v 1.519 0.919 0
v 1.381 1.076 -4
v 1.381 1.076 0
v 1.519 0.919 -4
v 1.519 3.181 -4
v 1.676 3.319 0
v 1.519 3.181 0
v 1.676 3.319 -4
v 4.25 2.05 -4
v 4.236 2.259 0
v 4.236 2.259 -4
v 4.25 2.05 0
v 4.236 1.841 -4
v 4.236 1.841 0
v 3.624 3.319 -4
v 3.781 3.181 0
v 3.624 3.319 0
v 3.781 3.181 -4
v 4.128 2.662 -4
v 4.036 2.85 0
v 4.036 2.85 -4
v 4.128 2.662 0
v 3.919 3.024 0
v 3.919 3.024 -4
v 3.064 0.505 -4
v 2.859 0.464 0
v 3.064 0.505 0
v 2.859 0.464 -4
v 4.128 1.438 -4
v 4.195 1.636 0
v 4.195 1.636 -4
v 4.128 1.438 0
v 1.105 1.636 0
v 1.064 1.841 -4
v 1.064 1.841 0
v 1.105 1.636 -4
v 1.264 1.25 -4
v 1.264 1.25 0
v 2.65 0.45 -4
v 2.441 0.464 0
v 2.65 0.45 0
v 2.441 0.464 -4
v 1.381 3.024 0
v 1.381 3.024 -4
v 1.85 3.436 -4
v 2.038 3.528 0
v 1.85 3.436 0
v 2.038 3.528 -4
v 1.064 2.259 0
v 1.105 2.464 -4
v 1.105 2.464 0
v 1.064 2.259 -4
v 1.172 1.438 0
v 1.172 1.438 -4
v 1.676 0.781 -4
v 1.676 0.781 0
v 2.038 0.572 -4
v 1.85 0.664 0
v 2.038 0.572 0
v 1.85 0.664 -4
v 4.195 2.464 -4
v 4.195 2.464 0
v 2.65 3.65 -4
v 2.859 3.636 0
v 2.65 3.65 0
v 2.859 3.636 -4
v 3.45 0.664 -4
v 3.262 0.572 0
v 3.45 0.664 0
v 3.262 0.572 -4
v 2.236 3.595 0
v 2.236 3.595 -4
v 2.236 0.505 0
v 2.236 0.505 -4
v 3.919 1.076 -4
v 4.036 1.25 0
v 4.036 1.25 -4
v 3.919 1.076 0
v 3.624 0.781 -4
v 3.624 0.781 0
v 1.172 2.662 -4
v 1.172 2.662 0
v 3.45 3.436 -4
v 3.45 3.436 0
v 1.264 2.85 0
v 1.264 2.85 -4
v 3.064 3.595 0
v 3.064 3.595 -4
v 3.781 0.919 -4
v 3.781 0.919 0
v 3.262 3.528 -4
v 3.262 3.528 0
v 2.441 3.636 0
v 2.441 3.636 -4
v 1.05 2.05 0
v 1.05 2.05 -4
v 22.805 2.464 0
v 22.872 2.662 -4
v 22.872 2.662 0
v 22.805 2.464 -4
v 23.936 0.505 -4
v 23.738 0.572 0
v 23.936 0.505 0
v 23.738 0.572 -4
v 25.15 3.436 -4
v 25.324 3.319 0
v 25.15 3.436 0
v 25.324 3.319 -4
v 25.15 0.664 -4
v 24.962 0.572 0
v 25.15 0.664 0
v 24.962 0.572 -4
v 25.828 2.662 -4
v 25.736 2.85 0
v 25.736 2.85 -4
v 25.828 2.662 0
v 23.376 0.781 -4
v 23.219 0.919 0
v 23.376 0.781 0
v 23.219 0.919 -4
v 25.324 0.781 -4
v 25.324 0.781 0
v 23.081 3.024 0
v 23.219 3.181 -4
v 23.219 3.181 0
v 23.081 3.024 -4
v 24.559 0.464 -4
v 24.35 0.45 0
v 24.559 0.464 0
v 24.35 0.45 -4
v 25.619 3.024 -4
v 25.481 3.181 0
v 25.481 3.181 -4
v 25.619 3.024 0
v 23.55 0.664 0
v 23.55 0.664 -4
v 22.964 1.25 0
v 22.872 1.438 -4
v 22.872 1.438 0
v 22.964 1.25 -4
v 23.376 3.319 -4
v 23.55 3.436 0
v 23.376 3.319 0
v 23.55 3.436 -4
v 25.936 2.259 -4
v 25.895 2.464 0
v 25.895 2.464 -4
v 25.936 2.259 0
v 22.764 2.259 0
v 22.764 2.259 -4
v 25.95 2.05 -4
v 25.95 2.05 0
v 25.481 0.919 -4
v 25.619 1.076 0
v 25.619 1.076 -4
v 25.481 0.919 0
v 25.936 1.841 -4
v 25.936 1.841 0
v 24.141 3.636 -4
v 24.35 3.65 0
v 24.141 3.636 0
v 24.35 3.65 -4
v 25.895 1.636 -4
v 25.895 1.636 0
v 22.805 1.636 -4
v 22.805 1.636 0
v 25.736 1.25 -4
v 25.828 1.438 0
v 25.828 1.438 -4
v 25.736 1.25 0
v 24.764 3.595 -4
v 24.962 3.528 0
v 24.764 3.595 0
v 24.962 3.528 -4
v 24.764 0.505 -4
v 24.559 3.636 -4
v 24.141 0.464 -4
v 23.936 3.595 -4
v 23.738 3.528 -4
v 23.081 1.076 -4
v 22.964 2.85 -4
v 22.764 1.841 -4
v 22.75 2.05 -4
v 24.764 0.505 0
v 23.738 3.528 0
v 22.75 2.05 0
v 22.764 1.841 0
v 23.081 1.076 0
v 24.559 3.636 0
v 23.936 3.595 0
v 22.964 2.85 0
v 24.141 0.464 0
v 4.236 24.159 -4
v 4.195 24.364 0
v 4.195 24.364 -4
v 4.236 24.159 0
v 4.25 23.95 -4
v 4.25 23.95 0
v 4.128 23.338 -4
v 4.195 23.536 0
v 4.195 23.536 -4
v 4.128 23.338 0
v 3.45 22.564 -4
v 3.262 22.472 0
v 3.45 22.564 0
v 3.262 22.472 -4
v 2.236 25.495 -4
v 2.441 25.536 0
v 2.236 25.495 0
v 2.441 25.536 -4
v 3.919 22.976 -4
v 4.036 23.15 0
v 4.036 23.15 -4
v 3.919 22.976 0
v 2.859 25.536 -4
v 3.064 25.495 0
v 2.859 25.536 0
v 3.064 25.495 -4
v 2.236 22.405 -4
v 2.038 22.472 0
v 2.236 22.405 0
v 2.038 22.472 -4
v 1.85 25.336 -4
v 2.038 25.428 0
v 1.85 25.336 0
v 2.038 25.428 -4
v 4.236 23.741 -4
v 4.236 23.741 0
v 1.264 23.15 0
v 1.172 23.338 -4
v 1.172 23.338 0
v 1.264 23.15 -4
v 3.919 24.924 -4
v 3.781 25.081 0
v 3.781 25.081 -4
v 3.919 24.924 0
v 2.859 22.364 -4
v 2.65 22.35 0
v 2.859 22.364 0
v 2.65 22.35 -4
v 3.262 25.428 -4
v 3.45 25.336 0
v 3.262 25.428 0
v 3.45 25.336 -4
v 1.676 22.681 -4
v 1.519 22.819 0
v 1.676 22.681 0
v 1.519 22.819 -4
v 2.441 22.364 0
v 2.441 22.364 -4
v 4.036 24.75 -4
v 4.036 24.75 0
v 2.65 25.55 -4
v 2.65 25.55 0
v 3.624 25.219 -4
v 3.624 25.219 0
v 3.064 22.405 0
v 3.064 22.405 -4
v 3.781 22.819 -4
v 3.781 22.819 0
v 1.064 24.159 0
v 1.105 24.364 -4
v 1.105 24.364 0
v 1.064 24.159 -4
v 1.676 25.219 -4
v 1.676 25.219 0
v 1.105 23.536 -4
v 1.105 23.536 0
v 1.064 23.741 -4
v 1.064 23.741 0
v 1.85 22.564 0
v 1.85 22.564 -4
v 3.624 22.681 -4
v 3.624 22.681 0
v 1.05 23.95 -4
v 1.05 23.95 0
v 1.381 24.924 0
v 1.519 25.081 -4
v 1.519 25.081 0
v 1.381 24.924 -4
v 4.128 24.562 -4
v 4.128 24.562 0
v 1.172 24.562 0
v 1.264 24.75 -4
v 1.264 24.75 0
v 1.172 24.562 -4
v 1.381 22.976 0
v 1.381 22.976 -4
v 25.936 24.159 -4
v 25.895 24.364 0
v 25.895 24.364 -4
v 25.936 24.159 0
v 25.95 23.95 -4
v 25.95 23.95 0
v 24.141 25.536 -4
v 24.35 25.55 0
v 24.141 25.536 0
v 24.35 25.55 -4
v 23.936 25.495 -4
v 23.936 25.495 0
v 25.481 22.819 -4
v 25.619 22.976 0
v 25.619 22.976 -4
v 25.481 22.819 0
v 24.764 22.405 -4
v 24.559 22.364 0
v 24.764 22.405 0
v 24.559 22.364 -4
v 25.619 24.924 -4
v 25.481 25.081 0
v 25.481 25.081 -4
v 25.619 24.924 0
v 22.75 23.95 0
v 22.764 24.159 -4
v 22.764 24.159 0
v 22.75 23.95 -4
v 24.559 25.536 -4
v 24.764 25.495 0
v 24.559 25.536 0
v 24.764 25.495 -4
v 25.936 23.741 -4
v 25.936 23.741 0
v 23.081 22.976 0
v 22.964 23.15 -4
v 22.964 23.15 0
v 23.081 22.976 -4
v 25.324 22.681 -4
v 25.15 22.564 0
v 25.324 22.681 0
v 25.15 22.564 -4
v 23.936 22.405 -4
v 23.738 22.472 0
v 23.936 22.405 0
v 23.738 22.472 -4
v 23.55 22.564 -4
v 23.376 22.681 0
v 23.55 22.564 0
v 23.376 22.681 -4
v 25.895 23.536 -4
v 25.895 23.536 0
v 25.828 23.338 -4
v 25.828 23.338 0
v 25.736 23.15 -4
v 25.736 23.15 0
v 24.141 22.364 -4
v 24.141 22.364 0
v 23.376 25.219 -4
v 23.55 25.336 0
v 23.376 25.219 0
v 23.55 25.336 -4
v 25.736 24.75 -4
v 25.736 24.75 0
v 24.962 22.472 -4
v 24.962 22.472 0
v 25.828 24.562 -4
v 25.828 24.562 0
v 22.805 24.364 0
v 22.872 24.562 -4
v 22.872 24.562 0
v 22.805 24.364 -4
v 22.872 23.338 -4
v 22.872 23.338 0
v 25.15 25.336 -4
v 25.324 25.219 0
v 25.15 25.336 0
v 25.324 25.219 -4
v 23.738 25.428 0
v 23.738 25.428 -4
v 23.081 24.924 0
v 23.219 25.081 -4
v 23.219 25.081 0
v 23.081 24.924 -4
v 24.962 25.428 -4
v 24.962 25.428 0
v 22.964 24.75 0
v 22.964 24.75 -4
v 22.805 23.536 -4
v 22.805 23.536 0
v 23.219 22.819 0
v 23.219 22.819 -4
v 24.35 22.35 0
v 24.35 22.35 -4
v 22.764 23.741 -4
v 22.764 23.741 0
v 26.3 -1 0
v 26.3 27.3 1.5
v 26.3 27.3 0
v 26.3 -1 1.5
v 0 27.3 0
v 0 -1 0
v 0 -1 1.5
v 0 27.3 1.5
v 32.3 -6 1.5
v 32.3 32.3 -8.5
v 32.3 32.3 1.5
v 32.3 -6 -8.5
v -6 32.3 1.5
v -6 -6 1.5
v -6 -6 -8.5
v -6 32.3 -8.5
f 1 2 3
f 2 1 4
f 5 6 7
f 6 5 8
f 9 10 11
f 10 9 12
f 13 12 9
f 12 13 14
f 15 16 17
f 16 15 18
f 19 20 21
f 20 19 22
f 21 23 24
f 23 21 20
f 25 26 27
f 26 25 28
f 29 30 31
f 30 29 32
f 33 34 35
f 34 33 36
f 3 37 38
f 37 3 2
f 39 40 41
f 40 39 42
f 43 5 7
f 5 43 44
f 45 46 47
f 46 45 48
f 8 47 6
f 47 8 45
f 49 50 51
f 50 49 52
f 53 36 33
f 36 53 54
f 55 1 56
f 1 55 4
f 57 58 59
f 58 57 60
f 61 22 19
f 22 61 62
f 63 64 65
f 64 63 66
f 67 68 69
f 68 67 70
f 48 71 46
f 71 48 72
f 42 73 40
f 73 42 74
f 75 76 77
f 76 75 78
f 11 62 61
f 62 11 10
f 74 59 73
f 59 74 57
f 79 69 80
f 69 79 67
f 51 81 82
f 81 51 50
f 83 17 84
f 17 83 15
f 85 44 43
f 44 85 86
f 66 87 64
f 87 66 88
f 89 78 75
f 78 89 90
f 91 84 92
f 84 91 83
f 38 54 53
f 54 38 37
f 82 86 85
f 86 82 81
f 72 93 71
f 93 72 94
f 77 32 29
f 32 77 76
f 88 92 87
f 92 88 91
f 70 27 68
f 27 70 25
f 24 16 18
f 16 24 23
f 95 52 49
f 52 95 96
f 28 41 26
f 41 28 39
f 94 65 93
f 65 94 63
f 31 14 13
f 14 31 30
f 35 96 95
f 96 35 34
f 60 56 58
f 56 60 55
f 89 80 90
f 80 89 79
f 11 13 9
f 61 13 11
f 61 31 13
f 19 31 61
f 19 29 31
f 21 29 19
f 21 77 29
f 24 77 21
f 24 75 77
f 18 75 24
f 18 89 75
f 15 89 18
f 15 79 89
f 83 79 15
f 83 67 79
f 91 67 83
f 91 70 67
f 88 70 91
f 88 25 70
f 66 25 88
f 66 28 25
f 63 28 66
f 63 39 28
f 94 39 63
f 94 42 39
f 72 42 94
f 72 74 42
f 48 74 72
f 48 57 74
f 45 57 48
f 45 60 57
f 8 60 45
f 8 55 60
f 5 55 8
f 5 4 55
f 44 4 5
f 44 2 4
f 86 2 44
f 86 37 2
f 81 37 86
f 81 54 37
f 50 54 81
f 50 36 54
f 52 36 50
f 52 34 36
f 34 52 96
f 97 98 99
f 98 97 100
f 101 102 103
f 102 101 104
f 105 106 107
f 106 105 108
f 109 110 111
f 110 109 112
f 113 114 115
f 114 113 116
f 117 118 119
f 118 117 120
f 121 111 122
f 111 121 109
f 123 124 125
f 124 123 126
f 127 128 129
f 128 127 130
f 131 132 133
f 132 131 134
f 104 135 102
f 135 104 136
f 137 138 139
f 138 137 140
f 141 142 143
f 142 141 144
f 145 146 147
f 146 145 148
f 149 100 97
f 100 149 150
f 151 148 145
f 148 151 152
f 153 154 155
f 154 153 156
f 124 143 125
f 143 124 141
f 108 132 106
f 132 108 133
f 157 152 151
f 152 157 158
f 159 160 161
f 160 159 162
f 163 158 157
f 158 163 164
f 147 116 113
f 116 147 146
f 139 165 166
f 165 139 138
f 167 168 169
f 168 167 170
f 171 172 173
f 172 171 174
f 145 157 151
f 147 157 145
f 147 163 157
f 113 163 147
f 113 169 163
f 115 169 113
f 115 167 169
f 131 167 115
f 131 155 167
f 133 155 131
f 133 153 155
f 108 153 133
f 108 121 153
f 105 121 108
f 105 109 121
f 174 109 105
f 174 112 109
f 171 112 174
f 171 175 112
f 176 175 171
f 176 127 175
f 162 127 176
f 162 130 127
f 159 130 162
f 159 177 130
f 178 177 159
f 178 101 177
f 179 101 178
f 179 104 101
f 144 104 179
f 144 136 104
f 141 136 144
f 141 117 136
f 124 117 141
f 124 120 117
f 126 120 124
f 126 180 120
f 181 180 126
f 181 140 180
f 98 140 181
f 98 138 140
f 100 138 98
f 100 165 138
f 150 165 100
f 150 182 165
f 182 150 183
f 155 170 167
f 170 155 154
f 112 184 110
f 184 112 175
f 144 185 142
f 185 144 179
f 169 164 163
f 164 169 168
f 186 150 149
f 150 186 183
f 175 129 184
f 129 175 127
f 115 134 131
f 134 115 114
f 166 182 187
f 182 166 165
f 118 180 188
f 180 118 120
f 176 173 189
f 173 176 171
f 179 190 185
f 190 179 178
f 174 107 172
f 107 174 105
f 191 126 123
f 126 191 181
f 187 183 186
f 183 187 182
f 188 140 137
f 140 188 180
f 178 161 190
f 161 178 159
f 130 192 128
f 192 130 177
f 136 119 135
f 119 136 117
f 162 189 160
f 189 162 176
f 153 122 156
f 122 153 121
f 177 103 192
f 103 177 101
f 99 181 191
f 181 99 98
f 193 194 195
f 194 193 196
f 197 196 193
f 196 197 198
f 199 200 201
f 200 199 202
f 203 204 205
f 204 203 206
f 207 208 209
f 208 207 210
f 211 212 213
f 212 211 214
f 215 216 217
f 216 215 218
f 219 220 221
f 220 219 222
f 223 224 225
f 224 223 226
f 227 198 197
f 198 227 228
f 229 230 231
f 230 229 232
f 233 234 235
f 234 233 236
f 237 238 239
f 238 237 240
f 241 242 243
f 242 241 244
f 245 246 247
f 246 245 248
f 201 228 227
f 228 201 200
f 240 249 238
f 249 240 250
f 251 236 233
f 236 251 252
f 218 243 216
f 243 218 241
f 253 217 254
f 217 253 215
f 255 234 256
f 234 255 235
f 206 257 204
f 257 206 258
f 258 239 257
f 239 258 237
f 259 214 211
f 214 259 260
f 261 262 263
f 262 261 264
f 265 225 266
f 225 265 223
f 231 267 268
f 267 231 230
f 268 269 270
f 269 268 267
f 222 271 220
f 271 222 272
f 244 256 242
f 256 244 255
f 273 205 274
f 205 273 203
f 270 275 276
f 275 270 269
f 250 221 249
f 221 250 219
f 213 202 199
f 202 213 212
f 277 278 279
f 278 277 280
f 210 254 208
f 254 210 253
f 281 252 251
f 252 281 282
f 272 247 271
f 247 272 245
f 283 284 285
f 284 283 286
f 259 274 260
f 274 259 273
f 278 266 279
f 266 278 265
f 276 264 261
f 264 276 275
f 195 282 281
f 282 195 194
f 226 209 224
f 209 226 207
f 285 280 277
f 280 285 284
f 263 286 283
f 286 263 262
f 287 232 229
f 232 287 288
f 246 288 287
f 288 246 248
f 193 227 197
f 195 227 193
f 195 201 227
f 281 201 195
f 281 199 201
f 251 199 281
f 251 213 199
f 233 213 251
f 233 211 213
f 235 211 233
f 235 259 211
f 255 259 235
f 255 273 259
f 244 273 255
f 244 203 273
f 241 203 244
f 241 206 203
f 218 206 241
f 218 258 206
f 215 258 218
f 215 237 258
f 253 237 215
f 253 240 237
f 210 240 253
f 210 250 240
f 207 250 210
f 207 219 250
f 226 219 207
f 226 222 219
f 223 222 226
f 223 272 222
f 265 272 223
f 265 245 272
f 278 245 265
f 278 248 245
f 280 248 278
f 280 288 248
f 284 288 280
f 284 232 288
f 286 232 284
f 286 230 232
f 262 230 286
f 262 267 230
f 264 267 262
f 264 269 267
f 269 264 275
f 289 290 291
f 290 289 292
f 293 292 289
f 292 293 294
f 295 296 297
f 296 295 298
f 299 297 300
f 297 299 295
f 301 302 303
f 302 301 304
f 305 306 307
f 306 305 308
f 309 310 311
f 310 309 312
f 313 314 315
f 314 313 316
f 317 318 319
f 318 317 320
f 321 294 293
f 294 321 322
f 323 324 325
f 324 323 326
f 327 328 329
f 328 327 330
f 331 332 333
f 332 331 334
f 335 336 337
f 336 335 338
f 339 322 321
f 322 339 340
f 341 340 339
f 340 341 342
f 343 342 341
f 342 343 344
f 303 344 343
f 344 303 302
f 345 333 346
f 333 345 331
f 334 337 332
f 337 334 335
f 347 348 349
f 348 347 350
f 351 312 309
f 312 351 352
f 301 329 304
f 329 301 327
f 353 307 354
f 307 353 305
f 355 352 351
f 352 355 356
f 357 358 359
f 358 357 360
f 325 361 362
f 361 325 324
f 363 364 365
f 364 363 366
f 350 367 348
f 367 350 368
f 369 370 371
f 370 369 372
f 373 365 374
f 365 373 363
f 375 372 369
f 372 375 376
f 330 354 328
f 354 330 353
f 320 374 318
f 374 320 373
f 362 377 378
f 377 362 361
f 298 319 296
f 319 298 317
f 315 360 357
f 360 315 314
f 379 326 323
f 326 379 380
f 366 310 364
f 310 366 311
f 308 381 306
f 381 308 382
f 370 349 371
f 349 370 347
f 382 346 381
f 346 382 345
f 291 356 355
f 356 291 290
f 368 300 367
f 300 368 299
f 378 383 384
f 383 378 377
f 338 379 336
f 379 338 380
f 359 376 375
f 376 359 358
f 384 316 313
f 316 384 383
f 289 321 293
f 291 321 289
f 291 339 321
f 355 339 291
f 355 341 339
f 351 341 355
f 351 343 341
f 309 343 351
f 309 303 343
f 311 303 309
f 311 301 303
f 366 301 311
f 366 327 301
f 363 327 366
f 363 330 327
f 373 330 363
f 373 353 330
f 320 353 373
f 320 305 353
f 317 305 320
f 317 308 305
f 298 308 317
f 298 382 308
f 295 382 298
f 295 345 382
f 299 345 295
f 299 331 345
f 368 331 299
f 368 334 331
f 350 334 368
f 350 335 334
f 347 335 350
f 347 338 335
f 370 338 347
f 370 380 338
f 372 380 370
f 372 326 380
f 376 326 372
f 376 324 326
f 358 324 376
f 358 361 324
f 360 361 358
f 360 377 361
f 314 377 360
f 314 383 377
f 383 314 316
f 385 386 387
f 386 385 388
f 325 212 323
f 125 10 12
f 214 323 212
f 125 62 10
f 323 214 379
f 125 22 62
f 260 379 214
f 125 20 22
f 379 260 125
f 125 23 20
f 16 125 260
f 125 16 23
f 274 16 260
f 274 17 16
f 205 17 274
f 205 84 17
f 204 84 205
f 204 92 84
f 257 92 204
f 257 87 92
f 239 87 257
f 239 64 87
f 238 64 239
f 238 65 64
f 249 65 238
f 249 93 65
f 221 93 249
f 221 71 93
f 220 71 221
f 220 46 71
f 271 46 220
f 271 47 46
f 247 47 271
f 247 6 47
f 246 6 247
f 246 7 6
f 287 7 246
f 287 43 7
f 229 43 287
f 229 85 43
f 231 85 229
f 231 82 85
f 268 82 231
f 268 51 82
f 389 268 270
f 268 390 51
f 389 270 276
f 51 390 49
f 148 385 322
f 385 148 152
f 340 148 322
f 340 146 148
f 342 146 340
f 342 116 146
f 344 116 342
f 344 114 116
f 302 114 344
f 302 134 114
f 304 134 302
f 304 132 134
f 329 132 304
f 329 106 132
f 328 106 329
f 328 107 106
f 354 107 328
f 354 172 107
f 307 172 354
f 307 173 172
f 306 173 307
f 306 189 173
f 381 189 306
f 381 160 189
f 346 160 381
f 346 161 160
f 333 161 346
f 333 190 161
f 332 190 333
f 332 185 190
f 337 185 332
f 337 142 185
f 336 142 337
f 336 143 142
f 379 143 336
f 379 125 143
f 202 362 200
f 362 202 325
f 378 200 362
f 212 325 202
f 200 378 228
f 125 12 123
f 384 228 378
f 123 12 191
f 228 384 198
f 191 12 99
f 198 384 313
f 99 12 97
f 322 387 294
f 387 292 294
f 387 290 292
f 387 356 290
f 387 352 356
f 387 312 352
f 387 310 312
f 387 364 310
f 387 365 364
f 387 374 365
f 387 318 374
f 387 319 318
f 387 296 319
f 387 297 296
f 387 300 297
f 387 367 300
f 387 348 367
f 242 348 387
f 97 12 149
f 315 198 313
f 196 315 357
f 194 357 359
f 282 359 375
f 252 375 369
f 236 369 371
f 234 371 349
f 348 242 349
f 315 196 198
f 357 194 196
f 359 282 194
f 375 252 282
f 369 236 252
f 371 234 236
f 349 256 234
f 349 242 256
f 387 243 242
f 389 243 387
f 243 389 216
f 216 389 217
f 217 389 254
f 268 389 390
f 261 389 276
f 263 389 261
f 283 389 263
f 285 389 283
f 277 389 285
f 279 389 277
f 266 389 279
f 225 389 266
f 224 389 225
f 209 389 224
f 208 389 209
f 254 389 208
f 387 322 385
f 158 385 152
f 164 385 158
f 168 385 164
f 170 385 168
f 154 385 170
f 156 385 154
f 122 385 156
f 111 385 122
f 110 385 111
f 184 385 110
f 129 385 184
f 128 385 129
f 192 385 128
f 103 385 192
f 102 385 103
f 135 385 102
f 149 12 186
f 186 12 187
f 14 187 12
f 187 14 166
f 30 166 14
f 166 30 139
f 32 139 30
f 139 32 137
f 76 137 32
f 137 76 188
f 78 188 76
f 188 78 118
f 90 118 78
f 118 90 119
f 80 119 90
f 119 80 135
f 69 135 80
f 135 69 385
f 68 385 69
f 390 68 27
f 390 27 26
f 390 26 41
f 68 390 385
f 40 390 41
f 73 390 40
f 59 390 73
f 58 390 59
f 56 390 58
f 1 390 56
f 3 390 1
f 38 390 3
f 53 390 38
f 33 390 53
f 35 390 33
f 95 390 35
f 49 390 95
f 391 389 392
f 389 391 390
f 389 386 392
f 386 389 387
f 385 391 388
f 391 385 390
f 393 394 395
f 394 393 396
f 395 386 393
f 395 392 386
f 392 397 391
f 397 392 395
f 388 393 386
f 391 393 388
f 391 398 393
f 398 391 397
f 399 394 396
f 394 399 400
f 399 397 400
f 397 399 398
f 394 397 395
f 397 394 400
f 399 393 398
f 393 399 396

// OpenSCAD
// file: screw_mounts.scad
// ============================================================
// Screw mounts — reusable brass-insert + screw-hole cutters
//
// Two negative-geometry modules, meant to be subtracted (difference())
// from a part.  They are the matched halves of one fastened joint:
//
//   insert_hole(size)        bore for a brass heat-set insert, pressed
//                            into the part that the screw threads INTO.
//   screw_hole(size, length) clearance hole in the COMPLEMENTARY part the
//                            screw passes THROUGH — exact screw-body bore
//                            that tapers out (countersink) into the head.
//
// `size` is "M2" or "M3".  Dimensions for the inserts match those already
// used in sight_housing.scad (M2: ø3.20 × 4.0; M3: ø4.00 × 5.0).
//
// Orientation convention (both modules):
//   The mouth of the hole sits at the LOCAL ORIGIN on the Z=0 plane and
//   the hole bores DOWNWARD into -Z, i.e. the fastener is imagined entering
//   from +Z.  Each cutter pokes +0.1 mm past Z=0 so the Boolean cleanly
//   breaks the surface.  translate()/rotate() the call to place it on the
//   real face, exactly like the bores in sight_housing.scad.
//
//   insert_hole : insert is pressed in from +Z; bore is +Z-deep into stock.
//   screw_hole  : head sits flush at Z=0 (countersunk), body bores to -Z.
// ============================================================

// ── Fastener table ───────────────────────────────────────────
// One row per screw size.  Head thickness is the user-specified value
// (M3 = 1.75 mm, M2 = 1.50 mm); head diameter is the user-specified
// countersunk flat-head OD (M3 = 5.8, M2 = 4.0).  Body diameter is the
// nominal thread OD — the screw hole uses this EXACTLY (see screw_hole()).
function screw_body_d(size) =
  size == "M3" ? 3.00 :
  size == "M2" ? 2.00 : undef;

function screw_head_d(size) =
  size == "M3" ? 5.80 :
  size == "M2" ? 4.00 : undef;

function screw_head_t(size) =
  size == "M3" ? 1.75 :
  size == "M2" ? 1.50 : undef;

// Brass heat-set insert bore (outer dia + length) — values shared with
// sight_housing.scad's insert_d / insert_depth (M2) and join_insert_d /
// join_insert_depth (M3).
function insert_bore_d(size) =
  size == "M3" ? 4.00 :
  size == "M2" ? 3.20 : undef;

function insert_bore_depth(size) =
  size == "M3" ? 5.00 :
  size == "M2" ? 4.00 : undef;

// ── Brass-insert bore ────────────────────────────────────────
// Pocket for a heat-set insert, pressed in from +Z.  Bores `depth` into
// -Z (default = the size's standard insert length) and pokes 0.1 mm past
// the Z=0 face so the cut breaks the surface cleanly.
//   depth : override the bore depth (mm).  Leave default for the standard
//           insert length.
module insert_hole(size, depth = undef) {
  d = insert_bore_d(size);
  h = depth == undef ? insert_bore_depth(size) : depth;
  translate([0, 0, -h])
    cylinder(d = d, h = h + 0.1);
}

// ── Screw clearance hole + head countersink ──────────────────
// Cut in the complementary part the screw passes THROUGH.  The straight
// bore is EXACTLY the screw-body diameter (plus optional `clearance`,
// default 0 — a true body-diameter hole as requested); the top
// screw_head_t(size) mm flares out as a cone from the body diameter up to
// the full head diameter, so a countersunk head seats flush at Z=0.
//   length    : straight body-bore length below the taper (mm).  Set to
//               the wall/material thickness the screw shank crosses; the
//               taper sits on top of this, the bore pokes 0.1 mm past the
//               far side for a clean break.
//   clearance : added to the body diameter (mm).  Default 0 = exact body
//               diameter.  Use e.g. 0.4 for a free-fit clearance hole.
module screw_hole(size, length, clearance = 0) {
  bd = screw_body_d(size) + clearance; // straight bore = exact body dia (+fit)
  hd = screw_head_d(size);             // countersink mouth = head dia
  ht = screw_head_t(size);             // taper height = head thickness

  union() {
    // straight body-clearance bore, hanging below the taper
    translate([0, 0, -(length + ht)])
      cylinder(d = bd, h = length + 0.1);
    // head countersink: cone flaring from body dia up to head dia
    translate([0, 0, -ht])
      cylinder(d1 = bd, d2 = hd, h = ht);
    // break the top surface above the head mouth
    translate([0, 0, -0.001])
      cylinder(d = hd, h = 0.1);
  }
}

// ── Straight clearance bore (no head) ────────────────────────
// Plain body-clearance hole the screw shank passes through (e.g. a bolt
// crossing a skirt/wall).  Mouth at Z=0, bores `length` into −Z with a +0.1 mm
// overshoot at the mouth to break the surface.
//   length : material thickness the shank crosses.
//   clear  : added to the screw-body diameter (default 0).
module clearance_hole(size, length, clear = 0) {
  translate([0, 0, -length])
    cylinder(d = screw_body_d(size) + clear, h = length + 0.1);
}

// ── Clearance bore + cylindrical socket-head counterbore ─────
// For a socket-head cap screw seated below a surface: a straight shank
// clearance bore through `length`, plus a flat-bottomed cylindrical recess
// (head_d × head_h) at the mouth.  Mouth at Z=0, bores into −Z, +0.1 mm
// overshoot on both bores.  head_d/head_h default to the size's flat-head
// table values; override for socket heads.
//   length : full thickness the shank crosses (the plate/lid).
//   clear  : added to the screw-body diameter for the shank (default 0).
module counterbore_hole(size, length, clear = 0, head_d = undef, head_h = undef) {
  hd = head_d == undef ? screw_head_d(size) : head_d;
  hh = head_h == undef ? screw_head_t(size) : head_h;
  union() {
    // shank clearance bore through the full length (+0.1 both ends)
    translate([0, 0, -(length + 0.1)])
      cylinder(d = screw_body_d(size) + clear, h = length + 0.2);
    // cylindrical head recess at the mouth
    translate([0, 0, -hh])
      cylinder(d = hd, h = hh + 0.1);
  }
}

// ── Demo (only renders when this file is opened directly; `use <>`
// imports the modules/functions above and ignores everything below) ──
$fn = 48;
demo_block = 14;
// left: a block with an M3 insert bore;  right: a block with an M3 screw
// hole, sliced so the countersink + body bore are visible.
difference() {
  translate([-demo_block - 2, -demo_block / 2, -demo_block])
    cube([demo_block, demo_block, demo_block]);
  insert_hole("M3");
}
difference() {
  translate([2, -demo_block / 2, -demo_block])
    cube([demo_block, demo_block, demo_block]);
  translate([2 + demo_block / 2, 0, 0])
    screw_hole("M3", demo_block - 4);
}
// main file
use <screw_mounts.scad>

// Display PCB pocket (negative geometry) with the four M2 screw-insert
// bores beneath its floor.  Pocket floor sits at Z=0; the inserts bore down
// into -Z, so the screws enter from +Z through the PCB.
//
// Sized for the Waveshare 0.96" OLED: 26 x 26 mm board, mounting holes
// inset 2.50 (left) / 1.80 (right) horizontally and 1.90 (bottom) / 2.20
// (top) vertically.
module display_pocket() {
  pcb_w = 26.00;
  pcb_h = 26.00;
  pcb_t = 1.60;
  clearance = 0.30;
  top_bottom_extra = 1.00; // extra clearance added above/below the PCB (Y)

  // Mounting-hole centres from the PCB's lower-left corner.
  holes = [
    [2.50, 1.90],
    [pcb_w - 1.80, 1.90],
    [2.50, pcb_h - 2.20],
    [pcb_w - 1.80, pcb_h - 2.20],
  ];

  // PCB pocket — clearance/2 on every side so the PCB drops in freely, plus
  // an extra 1 mm top/bottom (Y) so the board has more room to seat vertically.
  translate([0, -top_bottom_extra, 0])
    cube([
      pcb_w + clearance,
      pcb_h + clearance + 2 * top_bottom_extra,
      pcb_t + clearance + 0.1,
    ]);

  // M2 heat-set insert bores below the pocket floor, at the board's holes
  for (h = holes)
    translate([clearance / 2 + h[0], clearance / 2 + h[1], 0]) {
      insert_hole("M2");
    }
}

// Demo: the pocket cut into a solid block, opening at the block's top face.
$fn = 48;
pad = 6;
pocket_w = 26.30; // pcb_w + clearance
pocket_d = 26.30; // pcb_h + clearance
difference() {
  translate([-pad, -pad, -8.5])
    cube([pocket_w + 2 * pad, pocket_d + 2 * pad, 10]);
  display_pocket();
}
